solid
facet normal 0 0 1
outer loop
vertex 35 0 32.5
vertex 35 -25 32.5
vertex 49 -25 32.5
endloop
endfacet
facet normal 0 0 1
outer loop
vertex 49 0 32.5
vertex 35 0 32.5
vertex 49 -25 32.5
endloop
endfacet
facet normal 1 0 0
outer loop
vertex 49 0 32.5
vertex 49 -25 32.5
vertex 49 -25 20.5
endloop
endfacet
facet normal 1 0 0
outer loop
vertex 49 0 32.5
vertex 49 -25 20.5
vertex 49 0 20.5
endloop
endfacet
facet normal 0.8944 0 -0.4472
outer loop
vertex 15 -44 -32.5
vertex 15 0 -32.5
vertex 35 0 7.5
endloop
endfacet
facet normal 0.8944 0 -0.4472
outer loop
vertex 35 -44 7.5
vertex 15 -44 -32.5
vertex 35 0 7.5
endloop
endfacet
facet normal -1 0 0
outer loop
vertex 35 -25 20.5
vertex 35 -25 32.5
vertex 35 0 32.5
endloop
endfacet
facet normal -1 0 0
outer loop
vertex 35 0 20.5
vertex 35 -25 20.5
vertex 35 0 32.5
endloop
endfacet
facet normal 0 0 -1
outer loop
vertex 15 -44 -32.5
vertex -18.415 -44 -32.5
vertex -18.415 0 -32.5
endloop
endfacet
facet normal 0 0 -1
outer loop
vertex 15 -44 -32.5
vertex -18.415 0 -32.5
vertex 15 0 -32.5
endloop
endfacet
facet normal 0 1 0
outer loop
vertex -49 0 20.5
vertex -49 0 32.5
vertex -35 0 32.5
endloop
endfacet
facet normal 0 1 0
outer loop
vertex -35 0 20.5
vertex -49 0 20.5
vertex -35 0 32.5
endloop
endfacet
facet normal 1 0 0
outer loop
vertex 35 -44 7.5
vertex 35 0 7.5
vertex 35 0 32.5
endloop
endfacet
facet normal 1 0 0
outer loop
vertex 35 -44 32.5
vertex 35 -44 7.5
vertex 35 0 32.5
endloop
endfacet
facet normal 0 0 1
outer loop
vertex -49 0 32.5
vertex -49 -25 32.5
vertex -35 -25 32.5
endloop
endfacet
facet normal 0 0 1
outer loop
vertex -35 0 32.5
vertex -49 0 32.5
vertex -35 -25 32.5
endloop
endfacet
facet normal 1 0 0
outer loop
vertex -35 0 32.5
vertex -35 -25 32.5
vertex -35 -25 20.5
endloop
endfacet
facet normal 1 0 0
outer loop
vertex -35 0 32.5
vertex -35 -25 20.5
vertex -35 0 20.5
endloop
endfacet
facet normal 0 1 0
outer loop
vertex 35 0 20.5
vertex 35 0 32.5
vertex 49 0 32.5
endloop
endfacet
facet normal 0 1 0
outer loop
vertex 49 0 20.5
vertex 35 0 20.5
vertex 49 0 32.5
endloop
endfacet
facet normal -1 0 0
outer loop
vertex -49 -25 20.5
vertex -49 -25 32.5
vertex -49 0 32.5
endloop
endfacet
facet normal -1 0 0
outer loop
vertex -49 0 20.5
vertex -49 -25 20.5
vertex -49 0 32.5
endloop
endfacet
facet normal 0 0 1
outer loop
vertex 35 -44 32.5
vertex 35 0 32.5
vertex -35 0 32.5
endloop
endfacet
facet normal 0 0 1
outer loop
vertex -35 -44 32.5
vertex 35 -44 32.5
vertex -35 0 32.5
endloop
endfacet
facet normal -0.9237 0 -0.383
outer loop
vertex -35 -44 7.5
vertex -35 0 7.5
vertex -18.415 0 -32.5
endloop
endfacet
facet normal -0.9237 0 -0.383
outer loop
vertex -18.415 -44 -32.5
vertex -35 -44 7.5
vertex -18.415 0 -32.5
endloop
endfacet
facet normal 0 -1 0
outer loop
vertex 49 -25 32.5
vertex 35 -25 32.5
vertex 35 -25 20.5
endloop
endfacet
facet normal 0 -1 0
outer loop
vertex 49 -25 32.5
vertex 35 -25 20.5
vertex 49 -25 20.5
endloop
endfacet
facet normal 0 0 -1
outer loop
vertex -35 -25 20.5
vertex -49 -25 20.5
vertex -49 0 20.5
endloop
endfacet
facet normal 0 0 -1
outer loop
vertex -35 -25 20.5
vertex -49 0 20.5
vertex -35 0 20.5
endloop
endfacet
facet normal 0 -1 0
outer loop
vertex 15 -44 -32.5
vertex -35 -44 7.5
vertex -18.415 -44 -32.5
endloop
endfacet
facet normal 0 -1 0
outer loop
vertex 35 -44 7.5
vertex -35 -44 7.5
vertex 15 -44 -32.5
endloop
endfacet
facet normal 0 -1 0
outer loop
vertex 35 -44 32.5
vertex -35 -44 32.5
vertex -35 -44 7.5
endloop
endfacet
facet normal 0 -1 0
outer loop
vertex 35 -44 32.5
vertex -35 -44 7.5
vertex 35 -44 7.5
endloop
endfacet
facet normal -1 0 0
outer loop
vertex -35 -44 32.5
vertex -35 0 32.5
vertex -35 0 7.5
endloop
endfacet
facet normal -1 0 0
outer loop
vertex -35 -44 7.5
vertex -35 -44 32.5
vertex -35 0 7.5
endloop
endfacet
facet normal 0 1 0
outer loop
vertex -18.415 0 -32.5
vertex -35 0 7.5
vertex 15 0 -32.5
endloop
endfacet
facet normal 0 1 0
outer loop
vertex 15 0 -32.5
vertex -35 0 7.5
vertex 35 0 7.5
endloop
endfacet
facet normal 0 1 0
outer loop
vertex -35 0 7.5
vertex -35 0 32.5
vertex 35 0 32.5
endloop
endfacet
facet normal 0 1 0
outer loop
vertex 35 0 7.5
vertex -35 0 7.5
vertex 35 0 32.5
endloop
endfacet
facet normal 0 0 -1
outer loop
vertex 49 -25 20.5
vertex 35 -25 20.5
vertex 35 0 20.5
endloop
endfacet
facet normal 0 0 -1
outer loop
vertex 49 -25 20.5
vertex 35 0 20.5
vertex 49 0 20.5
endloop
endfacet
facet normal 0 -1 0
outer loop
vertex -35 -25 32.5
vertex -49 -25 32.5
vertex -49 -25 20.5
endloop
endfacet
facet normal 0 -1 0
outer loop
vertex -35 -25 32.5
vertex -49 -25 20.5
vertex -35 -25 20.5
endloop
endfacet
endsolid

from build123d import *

# Parameters (mm, degrees)
F1_DEPTH = 44
F2_W     = 14
F2_H     = 25
F3_DEPTH = 12


with BuildPart() as f1:
    # F0 (on Front) → F1 (new body)
    with BuildSketch(Plane.XZ):
        Polygon((35, 20.5), (35, 32.5), (-35, 32.5), (-35, 20.5), (-35, 7.5), (-18.415261, -32.5), (15, -32.5), (35, 7.5), align=None)
    extrude(amount=F1_DEPTH)


with BuildPart() as f3:
    # F2 (on face) → F3 (new body)
    with BuildSketch(Plane.XY.offset(32.5)):
        with Locations((-42, -12.5)):
            Rectangle(F2_W, F2_H)
        with Locations((42, -12.5)):
            Rectangle(F2_W, F2_H)
    extrude(amount=-F3_DEPTH)


solid = Compound([f1.part, f3.part])
